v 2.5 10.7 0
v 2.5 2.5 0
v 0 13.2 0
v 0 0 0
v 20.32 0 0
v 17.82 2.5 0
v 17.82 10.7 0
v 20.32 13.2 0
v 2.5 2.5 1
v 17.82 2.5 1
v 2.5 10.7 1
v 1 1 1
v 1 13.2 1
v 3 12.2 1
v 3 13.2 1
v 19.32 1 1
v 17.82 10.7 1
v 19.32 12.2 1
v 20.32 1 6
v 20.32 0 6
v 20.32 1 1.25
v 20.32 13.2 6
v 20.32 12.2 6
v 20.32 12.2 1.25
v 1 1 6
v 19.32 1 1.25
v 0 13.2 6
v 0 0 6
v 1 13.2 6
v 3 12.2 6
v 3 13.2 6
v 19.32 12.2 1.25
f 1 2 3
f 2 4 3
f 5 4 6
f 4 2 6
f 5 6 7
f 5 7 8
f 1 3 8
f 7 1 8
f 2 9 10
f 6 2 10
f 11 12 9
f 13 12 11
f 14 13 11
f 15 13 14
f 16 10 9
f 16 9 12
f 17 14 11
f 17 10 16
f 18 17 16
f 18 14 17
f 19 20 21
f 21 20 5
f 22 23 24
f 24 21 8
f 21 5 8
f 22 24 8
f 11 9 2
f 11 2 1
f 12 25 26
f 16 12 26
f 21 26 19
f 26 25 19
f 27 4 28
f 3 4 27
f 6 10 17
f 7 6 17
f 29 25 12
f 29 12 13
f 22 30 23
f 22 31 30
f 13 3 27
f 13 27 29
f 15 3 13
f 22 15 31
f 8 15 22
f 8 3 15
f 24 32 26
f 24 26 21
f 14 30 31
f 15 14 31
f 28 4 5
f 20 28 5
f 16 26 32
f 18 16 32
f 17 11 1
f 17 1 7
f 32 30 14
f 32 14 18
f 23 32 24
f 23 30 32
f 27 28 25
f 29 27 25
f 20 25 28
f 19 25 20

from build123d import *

# Parameters (mm, degrees)
ESQUISSE1_W             = 20.32
ESQUISSE1_H             = 13.2
BOSS_EXTRU_1_DEPTH      = 6
ESQUISSE2_W             = 18.32
ESQUISSE2_H             = 11.2
ENL_V_MAT_EXTRU_1_DEPTH = 5
ESQUISSE3_W             = 2
ESQUISSE3_H             = 1
ENL_V_MAT_EXTRU_2_DEPTH = 5
ESQUISSE4_W             = 15.32
ESQUISSE4_H             = 8.2
ENL_V_MAT_EXTRU_3_DEPTH = 25.741511676
ESQUISSE6_W             = 1
ESQUISSE6_H             = 11.2
ENL_V_MAT_EXTRU_4_DEPTH = 4.75


with BuildPart() as part:
    # Esquisse1 → Boss.-Extru.1 (new body)
    with BuildSketch(Plane.XY):
        with Locations((10.16, 6.6)):
            Rectangle(ESQUISSE1_W, ESQUISSE1_H)
    extrude(amount=BOSS_EXTRU_1_DEPTH)

    # Esquisse2 → Enlèv. mat.-Extru.1 (cut)
    with BuildSketch(Plane.XY.offset(6)):
        with Locations((10.16, 6.6)):
            Rectangle(ESQUISSE2_W, ESQUISSE2_H)
    extrude(amount=-ENL_V_MAT_EXTRU_1_DEPTH, mode=Mode.SUBTRACT)

    # Esquisse3 → Enlèv. mat.-Extru.2 (cut)
    with BuildSketch(Plane.XY.offset(6)):
        with Locations((2, 12.7)):
            Rectangle(ESQUISSE3_W, ESQUISSE3_H)
    extrude(amount=-ENL_V_MAT_EXTRU_2_DEPTH, mode=Mode.SUBTRACT)

    # Esquisse4 → Enlèv. mat.-Extru.3 (cut, through all)
    with BuildSketch(Plane.XY.offset(1)):
        with Locations((10.16, 6.6)):
            Rectangle(ESQUISSE4_W, ESQUISSE4_H)
    extrude(amount=-ENL_V_MAT_EXTRU_3_DEPTH, mode=Mode.SUBTRACT)

    # Esquisse6 → Enlèv. mat.-Extru.4 (cut)
    with BuildSketch(Plane.XY.offset(6)):
        with Locations((19.82, 6.6)):
            Rectangle(ESQUISSE6_W, ESQUISSE6_H)
    extrude(amount=-ENL_V_MAT_EXTRU_4_DEPTH, mode=Mode.SUBTRACT)


solid = part.part
